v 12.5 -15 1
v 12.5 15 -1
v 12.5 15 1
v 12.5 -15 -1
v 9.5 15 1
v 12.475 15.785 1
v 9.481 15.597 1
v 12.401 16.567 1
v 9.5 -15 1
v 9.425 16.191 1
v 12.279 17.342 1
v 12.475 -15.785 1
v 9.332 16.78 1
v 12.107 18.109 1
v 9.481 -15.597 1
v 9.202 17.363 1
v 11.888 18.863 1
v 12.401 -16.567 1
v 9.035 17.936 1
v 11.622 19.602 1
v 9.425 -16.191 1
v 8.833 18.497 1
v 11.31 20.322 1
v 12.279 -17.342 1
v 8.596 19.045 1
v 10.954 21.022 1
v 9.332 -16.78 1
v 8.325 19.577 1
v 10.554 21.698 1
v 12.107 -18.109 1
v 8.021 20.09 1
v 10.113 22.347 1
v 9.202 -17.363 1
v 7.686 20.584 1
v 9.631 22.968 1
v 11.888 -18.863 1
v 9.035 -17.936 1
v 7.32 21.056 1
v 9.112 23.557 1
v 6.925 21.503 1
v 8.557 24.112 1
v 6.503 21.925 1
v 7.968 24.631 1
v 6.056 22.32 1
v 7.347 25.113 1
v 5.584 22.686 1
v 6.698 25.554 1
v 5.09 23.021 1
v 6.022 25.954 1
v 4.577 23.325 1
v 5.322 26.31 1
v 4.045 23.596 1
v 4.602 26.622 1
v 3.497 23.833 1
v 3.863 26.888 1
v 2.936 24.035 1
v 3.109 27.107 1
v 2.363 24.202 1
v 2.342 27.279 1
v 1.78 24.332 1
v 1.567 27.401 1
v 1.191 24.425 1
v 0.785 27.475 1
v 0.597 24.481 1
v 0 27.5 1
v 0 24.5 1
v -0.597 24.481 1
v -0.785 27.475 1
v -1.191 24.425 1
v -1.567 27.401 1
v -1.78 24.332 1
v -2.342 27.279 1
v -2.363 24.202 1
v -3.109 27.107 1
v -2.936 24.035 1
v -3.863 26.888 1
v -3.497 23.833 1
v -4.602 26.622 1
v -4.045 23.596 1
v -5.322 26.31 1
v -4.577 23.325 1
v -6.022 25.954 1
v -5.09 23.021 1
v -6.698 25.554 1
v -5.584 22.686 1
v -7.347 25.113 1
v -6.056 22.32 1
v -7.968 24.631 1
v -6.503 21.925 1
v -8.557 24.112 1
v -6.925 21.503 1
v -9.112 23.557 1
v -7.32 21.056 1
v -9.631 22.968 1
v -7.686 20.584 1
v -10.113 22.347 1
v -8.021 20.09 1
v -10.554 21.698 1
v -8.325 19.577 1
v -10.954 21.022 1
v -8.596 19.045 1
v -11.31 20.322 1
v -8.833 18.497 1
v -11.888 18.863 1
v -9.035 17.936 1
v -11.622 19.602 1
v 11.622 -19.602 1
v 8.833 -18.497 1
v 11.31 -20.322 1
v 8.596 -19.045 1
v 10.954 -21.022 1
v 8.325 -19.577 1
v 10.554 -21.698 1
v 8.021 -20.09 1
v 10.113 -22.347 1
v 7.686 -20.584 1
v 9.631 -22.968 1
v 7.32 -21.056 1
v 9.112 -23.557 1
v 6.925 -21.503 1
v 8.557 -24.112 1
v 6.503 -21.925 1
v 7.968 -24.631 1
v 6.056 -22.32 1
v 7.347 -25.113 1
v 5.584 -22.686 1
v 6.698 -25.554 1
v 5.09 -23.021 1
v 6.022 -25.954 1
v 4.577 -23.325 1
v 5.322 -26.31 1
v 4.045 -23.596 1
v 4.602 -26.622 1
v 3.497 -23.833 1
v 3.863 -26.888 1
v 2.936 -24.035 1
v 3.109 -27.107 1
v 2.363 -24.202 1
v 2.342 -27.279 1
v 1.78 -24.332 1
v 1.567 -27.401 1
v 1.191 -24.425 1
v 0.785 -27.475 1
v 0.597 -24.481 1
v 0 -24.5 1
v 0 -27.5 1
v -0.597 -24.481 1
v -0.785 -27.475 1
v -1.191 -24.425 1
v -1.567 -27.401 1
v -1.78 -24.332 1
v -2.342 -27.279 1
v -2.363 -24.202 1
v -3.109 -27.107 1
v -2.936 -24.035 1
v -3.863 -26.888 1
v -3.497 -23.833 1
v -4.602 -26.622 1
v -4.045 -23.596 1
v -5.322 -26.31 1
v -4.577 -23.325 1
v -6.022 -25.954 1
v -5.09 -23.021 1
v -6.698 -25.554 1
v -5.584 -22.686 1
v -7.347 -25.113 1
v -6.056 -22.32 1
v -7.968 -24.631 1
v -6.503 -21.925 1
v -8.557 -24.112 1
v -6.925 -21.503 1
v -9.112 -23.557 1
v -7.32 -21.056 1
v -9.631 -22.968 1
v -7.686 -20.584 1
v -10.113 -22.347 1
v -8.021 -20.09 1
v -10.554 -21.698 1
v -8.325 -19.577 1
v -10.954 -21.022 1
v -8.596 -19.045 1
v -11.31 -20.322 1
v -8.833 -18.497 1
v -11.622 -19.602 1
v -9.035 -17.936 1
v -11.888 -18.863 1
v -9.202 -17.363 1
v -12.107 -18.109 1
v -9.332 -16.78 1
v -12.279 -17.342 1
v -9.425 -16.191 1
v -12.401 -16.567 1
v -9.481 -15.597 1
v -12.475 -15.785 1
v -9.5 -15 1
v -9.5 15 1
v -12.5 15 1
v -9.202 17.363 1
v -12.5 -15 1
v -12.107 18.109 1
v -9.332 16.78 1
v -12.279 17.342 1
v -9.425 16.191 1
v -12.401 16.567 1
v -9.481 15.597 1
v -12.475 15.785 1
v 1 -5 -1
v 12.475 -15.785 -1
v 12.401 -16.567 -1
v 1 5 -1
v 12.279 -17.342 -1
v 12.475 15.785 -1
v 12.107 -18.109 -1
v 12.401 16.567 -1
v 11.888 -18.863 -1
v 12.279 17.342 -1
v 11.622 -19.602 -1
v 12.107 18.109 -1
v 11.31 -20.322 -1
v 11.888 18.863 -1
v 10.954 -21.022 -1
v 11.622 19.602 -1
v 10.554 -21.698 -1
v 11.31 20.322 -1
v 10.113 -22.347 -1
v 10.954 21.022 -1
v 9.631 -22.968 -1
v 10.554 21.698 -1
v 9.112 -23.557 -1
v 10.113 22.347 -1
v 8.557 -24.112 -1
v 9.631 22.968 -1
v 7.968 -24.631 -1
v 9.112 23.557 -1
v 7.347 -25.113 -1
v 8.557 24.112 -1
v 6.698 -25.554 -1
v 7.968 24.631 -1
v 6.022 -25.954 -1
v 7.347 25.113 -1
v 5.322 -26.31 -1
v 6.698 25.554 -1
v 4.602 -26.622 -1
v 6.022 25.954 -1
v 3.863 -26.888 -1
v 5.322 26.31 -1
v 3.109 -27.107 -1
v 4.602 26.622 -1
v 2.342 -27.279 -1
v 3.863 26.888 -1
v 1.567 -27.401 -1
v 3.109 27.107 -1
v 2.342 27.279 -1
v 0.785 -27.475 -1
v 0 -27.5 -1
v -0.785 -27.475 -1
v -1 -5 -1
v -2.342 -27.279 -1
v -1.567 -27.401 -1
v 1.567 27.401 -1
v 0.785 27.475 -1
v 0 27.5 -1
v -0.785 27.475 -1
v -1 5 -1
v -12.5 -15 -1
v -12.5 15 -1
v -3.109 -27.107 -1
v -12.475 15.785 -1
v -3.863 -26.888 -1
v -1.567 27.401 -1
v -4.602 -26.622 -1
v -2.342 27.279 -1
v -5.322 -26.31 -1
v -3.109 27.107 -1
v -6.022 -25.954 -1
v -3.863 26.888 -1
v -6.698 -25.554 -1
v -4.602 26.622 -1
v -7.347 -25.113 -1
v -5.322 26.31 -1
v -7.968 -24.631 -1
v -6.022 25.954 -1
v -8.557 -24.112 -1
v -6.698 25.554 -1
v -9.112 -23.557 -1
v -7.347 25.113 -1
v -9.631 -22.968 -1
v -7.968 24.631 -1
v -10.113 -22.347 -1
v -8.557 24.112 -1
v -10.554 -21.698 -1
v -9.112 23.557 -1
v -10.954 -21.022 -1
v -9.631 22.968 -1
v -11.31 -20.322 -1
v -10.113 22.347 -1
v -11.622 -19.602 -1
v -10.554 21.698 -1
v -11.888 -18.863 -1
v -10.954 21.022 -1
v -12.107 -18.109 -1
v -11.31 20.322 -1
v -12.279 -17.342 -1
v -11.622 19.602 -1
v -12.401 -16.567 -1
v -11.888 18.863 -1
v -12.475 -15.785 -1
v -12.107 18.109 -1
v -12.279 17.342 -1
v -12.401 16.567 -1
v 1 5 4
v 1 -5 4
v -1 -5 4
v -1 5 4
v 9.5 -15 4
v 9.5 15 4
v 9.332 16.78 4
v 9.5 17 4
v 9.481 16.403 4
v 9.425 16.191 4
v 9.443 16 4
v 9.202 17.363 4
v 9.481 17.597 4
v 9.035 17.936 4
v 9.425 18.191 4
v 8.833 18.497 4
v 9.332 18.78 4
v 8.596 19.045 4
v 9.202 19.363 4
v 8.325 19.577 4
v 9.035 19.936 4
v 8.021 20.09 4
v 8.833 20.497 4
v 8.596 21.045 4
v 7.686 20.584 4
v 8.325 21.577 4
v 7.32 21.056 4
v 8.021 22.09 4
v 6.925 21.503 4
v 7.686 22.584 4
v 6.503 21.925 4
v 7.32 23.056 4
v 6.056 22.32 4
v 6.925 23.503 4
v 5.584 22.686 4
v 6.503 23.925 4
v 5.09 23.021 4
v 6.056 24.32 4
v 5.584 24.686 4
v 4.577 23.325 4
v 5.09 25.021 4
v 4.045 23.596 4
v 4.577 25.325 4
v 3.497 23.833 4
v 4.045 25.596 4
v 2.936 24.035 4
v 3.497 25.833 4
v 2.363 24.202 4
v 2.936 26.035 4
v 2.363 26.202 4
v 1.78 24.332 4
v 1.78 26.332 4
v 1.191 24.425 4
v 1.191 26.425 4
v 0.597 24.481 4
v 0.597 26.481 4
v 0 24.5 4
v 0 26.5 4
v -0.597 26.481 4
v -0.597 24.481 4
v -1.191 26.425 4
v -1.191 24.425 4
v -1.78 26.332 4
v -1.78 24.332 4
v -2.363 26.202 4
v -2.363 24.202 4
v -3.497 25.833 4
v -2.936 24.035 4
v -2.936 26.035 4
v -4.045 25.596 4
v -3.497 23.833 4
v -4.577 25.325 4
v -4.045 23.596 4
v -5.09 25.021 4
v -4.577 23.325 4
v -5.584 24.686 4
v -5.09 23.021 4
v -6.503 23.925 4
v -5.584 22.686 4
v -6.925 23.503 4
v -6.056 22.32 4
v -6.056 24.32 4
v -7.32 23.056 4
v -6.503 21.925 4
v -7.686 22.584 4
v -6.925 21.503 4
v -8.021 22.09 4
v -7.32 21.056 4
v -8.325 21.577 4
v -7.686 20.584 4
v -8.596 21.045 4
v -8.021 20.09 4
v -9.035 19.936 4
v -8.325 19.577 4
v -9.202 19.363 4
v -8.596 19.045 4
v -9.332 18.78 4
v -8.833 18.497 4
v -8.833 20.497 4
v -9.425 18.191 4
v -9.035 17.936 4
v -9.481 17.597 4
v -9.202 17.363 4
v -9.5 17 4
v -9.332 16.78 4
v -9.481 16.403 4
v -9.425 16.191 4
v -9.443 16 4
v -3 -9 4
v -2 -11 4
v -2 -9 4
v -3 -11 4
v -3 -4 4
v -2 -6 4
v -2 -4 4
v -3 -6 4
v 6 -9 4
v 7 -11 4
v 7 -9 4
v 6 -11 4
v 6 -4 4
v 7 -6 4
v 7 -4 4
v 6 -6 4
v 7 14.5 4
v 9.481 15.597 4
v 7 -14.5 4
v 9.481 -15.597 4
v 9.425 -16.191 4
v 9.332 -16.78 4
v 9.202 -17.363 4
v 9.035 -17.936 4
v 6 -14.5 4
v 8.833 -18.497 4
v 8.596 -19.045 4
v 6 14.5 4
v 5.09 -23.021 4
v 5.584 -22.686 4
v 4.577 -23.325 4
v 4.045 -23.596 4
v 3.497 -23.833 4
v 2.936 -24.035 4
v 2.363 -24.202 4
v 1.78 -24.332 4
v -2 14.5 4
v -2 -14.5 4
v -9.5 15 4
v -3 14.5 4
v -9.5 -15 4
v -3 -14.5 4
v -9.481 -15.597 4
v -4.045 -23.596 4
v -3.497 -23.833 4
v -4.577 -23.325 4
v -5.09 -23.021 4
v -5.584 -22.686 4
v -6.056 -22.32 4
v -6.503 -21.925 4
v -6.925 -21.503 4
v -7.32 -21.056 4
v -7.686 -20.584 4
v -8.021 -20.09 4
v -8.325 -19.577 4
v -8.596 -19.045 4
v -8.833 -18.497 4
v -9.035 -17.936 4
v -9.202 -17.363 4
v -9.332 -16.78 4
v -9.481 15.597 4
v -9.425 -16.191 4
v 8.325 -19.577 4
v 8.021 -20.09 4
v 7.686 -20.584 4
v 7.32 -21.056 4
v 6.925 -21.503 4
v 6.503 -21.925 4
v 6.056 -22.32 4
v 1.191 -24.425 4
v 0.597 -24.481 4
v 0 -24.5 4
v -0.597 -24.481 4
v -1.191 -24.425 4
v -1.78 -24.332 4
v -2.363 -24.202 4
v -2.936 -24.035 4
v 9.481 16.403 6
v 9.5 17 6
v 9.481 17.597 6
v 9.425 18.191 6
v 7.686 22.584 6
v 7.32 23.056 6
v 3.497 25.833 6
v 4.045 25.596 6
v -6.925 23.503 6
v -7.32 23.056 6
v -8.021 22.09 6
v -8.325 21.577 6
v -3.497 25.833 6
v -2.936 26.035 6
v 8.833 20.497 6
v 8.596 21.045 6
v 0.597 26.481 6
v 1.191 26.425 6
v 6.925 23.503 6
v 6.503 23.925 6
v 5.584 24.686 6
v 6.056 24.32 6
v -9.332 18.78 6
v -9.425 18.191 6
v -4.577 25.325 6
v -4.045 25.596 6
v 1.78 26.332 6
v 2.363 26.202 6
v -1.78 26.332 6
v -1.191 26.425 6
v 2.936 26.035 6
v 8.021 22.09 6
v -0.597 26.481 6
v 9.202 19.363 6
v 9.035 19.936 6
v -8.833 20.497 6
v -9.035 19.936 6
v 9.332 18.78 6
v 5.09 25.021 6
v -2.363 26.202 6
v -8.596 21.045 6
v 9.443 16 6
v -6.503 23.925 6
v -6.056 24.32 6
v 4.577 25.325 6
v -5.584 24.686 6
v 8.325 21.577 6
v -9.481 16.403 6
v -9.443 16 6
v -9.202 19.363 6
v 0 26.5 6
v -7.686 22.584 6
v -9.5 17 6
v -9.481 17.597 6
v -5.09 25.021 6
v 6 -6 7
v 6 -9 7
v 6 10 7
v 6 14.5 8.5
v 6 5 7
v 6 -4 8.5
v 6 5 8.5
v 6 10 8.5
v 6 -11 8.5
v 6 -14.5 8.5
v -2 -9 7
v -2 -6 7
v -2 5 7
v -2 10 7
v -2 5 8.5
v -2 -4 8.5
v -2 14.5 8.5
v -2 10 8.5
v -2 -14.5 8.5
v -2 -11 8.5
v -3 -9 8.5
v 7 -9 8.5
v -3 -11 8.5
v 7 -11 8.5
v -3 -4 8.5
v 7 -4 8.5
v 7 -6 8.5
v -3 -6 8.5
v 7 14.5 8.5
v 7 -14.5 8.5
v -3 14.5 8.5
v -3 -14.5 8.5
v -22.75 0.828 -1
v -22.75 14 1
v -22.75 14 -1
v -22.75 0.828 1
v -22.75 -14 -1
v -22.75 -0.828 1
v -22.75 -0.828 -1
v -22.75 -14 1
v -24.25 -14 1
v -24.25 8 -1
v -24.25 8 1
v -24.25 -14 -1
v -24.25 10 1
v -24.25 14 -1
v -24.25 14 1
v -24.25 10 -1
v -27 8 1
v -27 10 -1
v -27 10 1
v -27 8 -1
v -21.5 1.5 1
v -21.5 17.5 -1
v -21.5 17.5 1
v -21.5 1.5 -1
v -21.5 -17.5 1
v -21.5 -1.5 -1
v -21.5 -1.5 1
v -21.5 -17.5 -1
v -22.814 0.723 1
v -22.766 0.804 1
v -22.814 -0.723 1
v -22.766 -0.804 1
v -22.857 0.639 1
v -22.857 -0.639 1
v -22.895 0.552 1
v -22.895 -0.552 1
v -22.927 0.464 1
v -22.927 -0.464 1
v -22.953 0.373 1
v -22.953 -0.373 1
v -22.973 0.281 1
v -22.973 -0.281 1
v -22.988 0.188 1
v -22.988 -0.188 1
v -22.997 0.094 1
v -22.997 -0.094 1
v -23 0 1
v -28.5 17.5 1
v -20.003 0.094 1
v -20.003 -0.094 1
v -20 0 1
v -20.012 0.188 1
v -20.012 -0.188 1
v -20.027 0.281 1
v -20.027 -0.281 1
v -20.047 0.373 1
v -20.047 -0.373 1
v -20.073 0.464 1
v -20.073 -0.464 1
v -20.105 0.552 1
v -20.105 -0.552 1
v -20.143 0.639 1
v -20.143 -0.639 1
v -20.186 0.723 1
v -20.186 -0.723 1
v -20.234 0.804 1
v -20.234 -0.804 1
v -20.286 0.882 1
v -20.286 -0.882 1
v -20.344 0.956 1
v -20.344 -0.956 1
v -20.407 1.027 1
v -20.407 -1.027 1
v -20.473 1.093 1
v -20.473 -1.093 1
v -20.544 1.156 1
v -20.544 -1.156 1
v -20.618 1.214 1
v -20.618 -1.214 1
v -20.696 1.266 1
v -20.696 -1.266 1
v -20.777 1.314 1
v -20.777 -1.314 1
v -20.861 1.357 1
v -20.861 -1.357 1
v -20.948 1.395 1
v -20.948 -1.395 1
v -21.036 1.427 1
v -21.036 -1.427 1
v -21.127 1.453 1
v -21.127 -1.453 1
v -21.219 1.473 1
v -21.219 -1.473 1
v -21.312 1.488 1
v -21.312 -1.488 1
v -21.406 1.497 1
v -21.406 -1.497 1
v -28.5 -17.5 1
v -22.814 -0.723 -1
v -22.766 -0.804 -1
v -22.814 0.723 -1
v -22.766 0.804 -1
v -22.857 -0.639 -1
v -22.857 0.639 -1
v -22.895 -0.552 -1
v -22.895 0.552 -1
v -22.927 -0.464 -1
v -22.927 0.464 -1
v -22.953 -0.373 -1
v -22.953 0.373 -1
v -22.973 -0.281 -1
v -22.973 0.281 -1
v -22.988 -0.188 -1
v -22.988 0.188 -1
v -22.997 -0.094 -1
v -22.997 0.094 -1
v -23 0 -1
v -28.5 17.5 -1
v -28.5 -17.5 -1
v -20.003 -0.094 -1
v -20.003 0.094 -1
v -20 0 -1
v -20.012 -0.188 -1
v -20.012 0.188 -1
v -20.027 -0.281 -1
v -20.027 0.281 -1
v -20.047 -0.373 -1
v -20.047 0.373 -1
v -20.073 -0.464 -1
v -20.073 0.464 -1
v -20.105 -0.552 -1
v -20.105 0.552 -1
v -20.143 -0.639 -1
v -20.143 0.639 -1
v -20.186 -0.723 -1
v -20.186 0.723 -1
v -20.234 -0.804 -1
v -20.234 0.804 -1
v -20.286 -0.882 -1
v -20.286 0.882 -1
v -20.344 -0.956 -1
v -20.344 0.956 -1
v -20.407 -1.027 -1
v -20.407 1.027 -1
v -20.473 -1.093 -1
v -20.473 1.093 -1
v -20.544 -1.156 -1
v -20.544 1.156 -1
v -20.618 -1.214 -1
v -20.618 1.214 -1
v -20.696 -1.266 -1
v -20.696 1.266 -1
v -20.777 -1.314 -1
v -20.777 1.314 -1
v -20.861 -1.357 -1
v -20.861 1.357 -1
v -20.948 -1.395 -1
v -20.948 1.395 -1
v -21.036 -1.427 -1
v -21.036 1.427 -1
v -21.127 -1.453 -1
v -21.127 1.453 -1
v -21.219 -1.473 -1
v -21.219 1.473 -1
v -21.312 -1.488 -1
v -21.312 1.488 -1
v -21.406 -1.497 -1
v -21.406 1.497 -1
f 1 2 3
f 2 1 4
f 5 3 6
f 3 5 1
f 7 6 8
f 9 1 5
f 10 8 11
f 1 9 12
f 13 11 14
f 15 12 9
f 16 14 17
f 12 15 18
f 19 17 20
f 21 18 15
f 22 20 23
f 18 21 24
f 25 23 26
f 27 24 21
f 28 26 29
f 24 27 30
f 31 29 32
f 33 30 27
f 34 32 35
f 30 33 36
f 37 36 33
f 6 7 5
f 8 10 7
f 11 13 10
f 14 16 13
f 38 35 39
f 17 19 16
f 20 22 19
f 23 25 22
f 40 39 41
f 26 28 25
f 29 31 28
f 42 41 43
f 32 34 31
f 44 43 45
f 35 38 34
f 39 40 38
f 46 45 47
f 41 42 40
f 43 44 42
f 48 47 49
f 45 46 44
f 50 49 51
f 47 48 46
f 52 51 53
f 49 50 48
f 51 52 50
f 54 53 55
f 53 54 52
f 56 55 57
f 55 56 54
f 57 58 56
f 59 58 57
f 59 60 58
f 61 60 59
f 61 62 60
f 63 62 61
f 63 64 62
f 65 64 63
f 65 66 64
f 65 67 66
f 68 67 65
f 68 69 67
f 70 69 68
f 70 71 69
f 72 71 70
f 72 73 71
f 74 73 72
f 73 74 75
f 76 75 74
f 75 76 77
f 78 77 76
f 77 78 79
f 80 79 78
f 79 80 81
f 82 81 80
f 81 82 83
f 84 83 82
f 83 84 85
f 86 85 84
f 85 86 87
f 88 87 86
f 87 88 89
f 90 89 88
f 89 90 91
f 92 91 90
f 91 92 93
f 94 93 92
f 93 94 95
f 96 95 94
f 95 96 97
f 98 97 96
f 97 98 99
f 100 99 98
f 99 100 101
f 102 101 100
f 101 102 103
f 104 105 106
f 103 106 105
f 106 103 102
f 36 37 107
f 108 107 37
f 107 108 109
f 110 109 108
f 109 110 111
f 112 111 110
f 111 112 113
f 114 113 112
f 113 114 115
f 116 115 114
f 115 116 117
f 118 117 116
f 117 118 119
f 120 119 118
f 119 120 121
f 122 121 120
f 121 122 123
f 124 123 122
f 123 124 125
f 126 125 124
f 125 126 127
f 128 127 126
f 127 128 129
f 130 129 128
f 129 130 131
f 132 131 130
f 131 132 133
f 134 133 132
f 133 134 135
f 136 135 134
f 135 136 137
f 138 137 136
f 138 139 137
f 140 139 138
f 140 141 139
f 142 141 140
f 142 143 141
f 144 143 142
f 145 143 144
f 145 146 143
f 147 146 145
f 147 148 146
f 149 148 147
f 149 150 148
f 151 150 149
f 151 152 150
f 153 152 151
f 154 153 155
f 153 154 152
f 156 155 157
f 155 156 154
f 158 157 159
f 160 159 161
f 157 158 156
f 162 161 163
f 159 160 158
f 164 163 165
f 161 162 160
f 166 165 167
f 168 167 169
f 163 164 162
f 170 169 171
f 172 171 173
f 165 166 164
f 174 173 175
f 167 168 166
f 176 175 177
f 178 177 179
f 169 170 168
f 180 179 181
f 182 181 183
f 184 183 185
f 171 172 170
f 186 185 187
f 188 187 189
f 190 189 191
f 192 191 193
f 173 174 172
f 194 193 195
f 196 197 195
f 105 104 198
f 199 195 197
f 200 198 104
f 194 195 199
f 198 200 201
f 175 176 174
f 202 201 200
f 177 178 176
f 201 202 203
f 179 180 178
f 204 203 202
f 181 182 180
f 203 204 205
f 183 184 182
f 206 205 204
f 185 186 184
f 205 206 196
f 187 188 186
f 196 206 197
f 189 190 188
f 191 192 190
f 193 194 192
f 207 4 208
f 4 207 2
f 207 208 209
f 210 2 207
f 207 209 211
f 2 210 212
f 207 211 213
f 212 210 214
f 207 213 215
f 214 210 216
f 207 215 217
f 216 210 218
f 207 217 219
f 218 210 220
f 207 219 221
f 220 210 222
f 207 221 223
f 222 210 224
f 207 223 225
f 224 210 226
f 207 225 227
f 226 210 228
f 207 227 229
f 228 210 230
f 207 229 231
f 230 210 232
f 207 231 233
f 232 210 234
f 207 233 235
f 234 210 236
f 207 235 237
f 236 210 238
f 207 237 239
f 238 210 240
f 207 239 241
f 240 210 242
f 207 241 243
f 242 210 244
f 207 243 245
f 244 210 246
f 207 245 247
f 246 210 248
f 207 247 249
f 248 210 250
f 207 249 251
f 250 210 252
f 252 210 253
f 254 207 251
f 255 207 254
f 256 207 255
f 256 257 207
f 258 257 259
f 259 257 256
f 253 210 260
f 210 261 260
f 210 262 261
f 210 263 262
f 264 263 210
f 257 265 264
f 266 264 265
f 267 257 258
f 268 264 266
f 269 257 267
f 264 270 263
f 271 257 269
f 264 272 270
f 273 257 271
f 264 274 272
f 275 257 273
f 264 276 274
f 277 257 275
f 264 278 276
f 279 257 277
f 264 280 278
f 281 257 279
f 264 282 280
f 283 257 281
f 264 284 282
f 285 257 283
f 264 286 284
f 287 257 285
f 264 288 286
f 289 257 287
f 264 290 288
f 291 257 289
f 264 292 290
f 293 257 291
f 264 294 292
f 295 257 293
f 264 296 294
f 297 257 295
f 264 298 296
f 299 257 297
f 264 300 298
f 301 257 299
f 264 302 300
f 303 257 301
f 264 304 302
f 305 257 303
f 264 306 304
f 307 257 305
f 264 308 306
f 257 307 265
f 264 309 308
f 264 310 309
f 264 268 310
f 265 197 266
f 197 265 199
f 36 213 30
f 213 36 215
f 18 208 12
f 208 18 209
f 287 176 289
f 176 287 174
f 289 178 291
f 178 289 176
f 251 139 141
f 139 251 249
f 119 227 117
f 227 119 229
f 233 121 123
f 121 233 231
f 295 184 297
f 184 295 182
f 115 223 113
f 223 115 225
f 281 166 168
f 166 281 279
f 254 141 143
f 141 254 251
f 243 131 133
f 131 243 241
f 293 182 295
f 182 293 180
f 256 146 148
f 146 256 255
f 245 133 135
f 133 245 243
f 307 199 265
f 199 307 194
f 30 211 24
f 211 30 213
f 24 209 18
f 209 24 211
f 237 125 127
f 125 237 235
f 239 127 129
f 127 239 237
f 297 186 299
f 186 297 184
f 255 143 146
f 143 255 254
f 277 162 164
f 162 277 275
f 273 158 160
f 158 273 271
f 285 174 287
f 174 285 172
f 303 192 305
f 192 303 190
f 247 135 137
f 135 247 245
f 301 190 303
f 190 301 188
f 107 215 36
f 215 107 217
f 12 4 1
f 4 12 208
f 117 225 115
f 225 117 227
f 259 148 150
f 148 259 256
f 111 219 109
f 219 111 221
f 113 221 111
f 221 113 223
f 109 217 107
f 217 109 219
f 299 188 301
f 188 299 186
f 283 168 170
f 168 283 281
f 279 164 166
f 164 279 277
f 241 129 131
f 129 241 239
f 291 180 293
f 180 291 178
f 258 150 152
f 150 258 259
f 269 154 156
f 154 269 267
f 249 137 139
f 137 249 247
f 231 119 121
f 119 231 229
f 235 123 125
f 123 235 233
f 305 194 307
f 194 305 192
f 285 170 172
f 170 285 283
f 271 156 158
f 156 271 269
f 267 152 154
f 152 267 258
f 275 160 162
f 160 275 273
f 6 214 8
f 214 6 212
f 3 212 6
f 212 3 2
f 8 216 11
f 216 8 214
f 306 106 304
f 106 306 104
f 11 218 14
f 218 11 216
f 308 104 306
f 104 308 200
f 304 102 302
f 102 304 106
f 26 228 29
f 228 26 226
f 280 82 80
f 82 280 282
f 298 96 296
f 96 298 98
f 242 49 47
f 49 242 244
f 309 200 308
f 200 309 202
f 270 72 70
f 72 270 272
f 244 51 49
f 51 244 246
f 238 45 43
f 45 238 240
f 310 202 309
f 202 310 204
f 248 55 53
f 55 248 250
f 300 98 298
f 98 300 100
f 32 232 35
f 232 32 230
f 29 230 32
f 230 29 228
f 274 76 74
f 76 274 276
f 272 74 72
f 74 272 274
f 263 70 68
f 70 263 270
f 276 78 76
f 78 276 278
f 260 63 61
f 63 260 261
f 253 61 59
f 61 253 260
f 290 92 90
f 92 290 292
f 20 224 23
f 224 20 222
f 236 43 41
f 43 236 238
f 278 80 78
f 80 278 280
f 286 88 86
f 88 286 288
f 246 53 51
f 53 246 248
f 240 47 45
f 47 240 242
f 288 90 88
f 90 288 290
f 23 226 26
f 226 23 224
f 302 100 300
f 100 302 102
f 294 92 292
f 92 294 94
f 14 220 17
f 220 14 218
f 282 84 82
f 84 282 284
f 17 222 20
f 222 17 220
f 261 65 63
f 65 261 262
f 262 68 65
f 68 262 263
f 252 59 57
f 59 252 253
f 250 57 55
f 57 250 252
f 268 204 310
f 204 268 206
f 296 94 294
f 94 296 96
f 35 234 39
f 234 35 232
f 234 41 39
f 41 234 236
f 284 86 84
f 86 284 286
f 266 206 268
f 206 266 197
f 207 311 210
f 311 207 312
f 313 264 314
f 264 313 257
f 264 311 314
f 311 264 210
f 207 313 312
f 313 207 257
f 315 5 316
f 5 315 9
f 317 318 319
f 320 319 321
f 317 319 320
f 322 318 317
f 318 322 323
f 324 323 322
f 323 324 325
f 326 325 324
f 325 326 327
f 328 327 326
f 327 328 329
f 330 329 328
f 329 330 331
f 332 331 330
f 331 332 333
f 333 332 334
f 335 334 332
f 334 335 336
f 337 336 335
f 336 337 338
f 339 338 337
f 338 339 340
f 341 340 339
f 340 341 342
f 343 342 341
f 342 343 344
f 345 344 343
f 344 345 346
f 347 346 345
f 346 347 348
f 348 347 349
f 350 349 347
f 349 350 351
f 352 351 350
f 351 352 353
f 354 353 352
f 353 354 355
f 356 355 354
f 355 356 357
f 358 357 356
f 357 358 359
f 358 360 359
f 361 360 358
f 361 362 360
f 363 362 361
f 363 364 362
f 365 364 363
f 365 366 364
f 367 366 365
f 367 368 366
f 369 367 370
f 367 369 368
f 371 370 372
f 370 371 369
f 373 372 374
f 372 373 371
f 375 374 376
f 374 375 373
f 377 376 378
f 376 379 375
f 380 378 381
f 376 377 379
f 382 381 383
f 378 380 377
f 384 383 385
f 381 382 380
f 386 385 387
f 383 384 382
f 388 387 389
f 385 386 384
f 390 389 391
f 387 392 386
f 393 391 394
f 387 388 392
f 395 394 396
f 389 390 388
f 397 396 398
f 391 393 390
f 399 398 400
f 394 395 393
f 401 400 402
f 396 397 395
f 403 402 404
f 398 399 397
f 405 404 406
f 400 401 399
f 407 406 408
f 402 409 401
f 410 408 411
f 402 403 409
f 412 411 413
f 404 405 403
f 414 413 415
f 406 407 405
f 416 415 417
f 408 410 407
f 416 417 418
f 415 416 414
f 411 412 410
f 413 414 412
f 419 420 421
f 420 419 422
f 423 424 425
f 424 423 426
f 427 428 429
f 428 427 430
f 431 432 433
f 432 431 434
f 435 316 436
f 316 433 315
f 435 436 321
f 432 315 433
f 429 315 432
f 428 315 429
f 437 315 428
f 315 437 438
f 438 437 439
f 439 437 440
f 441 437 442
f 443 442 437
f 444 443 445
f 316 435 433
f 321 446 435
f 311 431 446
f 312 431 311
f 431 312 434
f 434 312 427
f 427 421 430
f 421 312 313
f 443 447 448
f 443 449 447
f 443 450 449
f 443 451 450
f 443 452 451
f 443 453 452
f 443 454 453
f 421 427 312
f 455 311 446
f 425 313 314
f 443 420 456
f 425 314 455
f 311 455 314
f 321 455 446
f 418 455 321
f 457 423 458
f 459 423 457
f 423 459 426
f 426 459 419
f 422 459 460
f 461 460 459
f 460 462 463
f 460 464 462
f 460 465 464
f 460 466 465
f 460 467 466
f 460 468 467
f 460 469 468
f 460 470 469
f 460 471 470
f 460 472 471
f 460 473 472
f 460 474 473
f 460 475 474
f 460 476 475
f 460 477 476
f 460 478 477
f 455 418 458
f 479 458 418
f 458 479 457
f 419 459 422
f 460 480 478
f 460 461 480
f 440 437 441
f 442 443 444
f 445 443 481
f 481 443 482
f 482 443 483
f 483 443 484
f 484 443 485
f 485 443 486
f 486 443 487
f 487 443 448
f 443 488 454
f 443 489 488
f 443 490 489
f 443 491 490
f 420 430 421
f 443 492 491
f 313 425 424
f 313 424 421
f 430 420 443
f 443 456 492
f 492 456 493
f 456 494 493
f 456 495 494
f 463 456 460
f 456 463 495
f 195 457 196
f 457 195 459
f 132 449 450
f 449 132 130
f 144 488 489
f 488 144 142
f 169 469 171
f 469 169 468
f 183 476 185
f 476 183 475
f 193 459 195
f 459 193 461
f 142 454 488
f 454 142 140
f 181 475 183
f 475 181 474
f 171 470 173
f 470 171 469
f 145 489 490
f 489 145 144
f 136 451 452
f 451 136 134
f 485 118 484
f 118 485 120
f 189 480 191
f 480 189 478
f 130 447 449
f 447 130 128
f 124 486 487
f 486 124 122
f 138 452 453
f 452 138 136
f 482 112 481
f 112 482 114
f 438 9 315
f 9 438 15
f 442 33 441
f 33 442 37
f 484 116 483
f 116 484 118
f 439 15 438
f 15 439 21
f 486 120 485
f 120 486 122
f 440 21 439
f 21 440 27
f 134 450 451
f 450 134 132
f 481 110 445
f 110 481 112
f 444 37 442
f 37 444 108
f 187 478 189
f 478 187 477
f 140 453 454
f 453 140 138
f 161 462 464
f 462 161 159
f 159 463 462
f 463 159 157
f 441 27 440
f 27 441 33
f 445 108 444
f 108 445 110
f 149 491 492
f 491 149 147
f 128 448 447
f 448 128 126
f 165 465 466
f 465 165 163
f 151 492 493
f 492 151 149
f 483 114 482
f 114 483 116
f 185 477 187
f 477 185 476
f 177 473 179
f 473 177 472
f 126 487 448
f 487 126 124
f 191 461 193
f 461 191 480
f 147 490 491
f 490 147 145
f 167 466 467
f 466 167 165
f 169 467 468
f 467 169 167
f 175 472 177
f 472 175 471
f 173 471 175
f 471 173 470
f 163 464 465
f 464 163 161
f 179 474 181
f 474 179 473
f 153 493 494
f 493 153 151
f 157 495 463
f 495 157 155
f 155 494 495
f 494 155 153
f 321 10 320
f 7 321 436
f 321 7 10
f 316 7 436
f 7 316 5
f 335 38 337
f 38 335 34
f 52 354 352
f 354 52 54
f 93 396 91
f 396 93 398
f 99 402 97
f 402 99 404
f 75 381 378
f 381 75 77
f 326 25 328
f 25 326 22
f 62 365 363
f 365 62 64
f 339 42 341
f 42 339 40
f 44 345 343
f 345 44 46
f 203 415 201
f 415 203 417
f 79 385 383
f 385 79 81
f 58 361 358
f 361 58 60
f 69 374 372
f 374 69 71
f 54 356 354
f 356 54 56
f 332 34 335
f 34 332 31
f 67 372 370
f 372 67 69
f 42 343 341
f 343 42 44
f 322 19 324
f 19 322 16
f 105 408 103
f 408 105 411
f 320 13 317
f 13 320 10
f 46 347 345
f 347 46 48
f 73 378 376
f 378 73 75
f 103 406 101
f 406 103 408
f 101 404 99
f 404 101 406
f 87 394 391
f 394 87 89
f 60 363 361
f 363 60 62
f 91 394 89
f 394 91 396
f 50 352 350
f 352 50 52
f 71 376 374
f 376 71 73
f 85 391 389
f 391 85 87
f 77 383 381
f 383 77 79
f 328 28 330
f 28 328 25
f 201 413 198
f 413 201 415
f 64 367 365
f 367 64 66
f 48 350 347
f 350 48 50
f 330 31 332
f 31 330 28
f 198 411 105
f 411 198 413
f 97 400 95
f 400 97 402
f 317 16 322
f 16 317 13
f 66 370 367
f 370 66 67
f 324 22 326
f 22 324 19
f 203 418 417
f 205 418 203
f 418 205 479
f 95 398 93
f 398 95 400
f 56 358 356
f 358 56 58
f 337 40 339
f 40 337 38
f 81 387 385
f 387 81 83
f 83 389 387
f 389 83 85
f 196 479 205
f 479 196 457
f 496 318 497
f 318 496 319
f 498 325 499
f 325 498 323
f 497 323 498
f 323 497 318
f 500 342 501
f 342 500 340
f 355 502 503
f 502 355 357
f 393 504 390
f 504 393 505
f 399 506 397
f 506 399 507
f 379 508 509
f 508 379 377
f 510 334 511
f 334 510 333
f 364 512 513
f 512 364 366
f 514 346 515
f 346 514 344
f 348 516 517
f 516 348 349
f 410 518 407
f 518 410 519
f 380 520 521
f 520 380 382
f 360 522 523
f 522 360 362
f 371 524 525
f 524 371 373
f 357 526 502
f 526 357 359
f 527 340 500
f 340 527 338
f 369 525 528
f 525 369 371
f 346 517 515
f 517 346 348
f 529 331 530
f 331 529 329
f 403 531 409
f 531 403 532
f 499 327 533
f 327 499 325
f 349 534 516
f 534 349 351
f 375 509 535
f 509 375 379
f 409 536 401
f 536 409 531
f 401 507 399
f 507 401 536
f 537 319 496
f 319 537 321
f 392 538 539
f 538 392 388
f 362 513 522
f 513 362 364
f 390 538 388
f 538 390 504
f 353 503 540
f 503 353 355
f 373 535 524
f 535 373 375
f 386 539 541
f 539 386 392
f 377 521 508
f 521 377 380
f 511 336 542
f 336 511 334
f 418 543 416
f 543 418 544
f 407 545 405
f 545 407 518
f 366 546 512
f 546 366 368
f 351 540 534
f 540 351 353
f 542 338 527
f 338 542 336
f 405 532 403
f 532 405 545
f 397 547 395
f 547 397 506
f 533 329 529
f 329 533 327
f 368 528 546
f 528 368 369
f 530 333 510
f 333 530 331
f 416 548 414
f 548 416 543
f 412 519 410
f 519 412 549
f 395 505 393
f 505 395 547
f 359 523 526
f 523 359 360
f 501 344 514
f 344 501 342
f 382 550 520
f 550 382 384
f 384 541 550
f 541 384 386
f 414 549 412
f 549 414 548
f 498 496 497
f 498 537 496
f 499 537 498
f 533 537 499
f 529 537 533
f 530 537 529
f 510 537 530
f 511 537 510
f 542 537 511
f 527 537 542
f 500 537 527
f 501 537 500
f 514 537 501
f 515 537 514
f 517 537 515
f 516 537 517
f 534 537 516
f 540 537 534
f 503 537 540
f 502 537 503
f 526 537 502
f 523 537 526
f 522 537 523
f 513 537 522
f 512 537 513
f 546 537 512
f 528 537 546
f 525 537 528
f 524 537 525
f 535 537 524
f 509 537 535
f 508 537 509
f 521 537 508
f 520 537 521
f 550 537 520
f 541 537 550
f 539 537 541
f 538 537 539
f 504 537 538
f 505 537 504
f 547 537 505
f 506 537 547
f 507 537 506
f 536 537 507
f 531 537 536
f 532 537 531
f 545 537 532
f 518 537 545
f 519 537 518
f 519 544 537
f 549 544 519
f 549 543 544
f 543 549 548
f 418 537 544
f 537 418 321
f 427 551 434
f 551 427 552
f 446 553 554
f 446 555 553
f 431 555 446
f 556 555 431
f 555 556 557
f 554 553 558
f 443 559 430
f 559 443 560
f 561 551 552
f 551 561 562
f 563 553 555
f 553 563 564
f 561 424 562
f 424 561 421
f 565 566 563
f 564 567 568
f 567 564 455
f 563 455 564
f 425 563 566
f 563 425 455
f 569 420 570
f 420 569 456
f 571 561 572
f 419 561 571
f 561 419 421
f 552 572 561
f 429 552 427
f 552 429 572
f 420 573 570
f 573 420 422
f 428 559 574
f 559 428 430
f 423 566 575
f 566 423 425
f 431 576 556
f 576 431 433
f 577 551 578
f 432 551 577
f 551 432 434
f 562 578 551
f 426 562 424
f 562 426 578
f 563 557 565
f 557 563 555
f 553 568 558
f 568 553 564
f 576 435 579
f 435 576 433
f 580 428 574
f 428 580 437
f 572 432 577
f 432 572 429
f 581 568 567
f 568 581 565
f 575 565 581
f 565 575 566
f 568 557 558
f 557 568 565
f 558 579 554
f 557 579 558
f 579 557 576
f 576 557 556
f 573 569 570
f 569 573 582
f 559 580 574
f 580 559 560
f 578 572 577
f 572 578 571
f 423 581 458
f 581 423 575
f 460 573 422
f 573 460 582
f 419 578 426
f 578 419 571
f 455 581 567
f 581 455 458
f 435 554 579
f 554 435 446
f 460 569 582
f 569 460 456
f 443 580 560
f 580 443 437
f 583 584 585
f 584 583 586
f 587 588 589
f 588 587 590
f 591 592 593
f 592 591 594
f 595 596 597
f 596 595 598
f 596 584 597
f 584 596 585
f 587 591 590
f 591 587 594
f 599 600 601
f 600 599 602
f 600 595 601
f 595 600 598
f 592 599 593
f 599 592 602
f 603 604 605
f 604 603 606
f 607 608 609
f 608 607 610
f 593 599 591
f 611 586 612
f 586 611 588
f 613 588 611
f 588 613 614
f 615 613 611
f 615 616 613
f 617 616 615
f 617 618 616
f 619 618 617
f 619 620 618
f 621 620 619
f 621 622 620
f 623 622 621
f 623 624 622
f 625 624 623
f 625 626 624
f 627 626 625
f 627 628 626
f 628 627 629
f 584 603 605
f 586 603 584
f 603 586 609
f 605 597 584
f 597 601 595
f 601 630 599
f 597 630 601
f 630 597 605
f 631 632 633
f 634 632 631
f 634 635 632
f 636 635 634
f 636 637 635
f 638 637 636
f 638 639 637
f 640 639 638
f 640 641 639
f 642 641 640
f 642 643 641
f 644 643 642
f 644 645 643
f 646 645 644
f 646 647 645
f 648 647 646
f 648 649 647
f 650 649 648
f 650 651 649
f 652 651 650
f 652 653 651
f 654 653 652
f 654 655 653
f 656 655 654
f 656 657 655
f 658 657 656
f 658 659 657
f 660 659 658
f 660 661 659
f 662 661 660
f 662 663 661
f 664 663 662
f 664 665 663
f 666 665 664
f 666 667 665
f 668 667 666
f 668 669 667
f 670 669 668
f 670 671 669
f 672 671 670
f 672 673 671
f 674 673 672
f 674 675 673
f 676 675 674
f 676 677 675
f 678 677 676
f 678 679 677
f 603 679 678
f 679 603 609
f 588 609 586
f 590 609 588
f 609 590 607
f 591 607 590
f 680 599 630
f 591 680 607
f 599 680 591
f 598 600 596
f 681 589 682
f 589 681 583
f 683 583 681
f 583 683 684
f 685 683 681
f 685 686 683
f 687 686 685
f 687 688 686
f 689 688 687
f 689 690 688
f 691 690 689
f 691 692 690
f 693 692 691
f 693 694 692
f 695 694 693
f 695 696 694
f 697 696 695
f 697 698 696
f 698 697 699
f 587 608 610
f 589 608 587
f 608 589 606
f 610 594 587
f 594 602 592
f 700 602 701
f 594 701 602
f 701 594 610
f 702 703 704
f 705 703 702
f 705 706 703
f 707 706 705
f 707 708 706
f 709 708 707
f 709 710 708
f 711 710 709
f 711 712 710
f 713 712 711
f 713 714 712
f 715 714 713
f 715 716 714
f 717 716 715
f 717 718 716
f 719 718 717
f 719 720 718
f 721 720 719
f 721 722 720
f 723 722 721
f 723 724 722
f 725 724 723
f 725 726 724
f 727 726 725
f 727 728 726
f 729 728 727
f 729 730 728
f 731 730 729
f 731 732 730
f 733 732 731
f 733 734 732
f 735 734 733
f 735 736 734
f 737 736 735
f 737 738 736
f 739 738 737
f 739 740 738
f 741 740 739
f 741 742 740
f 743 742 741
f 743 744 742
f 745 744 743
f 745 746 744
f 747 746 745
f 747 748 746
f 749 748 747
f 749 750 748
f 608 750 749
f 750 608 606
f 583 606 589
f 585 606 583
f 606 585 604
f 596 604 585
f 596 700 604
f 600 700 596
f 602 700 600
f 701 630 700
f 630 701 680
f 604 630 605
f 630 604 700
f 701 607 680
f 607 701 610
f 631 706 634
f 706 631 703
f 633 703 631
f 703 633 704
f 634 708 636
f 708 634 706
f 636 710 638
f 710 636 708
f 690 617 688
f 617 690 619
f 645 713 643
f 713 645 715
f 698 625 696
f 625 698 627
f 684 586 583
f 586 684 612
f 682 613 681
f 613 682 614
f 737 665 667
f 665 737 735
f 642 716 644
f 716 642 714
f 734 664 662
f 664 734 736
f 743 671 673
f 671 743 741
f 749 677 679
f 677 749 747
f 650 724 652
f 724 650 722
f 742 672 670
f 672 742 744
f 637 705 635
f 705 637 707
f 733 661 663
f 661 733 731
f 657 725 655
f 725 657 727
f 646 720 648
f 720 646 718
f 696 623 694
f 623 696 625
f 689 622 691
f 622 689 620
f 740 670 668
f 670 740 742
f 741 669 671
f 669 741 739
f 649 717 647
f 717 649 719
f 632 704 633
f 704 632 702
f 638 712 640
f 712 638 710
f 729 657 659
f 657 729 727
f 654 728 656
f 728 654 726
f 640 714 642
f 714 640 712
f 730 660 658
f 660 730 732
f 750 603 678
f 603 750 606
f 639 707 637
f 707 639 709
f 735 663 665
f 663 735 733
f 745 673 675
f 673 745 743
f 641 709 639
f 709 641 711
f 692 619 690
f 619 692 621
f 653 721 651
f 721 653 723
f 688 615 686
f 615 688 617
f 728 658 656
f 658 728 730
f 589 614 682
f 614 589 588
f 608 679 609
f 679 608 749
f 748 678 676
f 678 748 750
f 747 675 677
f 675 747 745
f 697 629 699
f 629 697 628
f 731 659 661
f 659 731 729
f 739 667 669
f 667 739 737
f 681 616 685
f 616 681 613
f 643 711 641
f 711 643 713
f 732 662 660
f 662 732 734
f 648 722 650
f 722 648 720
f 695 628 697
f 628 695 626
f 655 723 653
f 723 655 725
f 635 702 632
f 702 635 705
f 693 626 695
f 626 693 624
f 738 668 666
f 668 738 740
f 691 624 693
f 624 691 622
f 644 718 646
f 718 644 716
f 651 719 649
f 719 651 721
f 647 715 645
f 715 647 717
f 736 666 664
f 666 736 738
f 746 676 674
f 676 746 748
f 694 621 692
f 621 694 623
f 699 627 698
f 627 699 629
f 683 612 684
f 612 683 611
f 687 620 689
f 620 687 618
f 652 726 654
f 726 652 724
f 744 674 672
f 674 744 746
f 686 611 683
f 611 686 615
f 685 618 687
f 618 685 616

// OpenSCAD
draw_main_face = 1;
// Main face sizes
face_plate_length = 55;
face_plate_width = 25;
face_plate_height = 2;
face_slot_length = 10;
face_slot_width =2;
// Recess plate sizes
recess_plate_inset =3;
recess_plate_length = face_plate_length-recess_plate_inset*2;
recess_plate_width = face_plate_width-recess_plate_inset*2;
recess_plate_height = 3;
// flange to secure bottom of trim clip
flange_height = 2;
flange_overhang = 2;
//bolt
bolt_length = 35;
bolt_width = 7;
bolt_height = 2;
bolt_spring_gap = 1.5;

// bolt_slot
bolt_slot_inner_width = bolt_width +1;
bolt_slot_outer_width = bolt_slot_inner_width+3;
module draw_plate_with_slot(l, w, h, slot_length, slot_width)
{
    difference()
    {           
        union()
        {
            cube([w, l-w, h], center=true);
            translate([0, -(l-w)/2, 0])       
                cylinder(h=h, r=w/2, center=true);       
            translate([0,(l-w)/2 , 0])       
                cylinder(h=h, r=w/2, center=true);       
        }
        cube([slot_width, slot_length, h+1], center=true);
    }     
}
module visible_part()
{
    if (draw_main_face  == 1)
        draw_plate_with_slot(face_plate_length, face_plate_width, face_plate_height, 
            face_slot_length, face_slot_width);
}
module recess_plate()
{
    translate([0,0,(face_plate_height+recess_plate_height)/2])
    {
        draw_plate_with_slot(recess_plate_length, recess_plate_width, recess_plate_height,
                            face_slot_length, face_slot_width);
    }
}
module flange()
{
    difference()
    {
        translate([0, (recess_plate_length-recess_plate_width)/2 + flange_overhang,face_plate_height + recess_plate_height])
            cylinder(h=flange_height, r=recess_plate_width/2, center=true);
        translate([0, 0, face_plate_height + recess_plate_height])
            cube([recess_plate_width, recess_plate_length-recess_plate_width +flange_overhang , flange_height+0.1], center=true);
    }
}
module slot_for_bolt()
{
    translate([2, 0, 6])
    {
        difference()
        {
            cube([10, 29, 5], center=true);
            union()
            {
                // main slot
                translate([0,0,-1])
                    cube([8, 30, 4], center=true);
                // engagement notch part way down
                translate([0, -10, 0])
                    cube([11,2,6], center=true);
                translate([0, -5, 0])
                    cube([11,2,6], center=true);
                // cut part of roof off
                translate([0, 0, 0])
                    cube([8,10,6], center =true);
                // cut part of roof off
                translate([0, -12.5, 0])
                    cube([8,5,6], center =true);
                translate([0, 12.5, 0])
                    cube([8,5,6], center =true);
            }
        }
    }
}
module sprung_bolt()
{
    // Move bolt out of the way of the trim piece
    translate([-face_plate_width, 0, 0])
    {
        difference()
        {
            cube([bolt_width,bolt_length,bolt_height], center=true);
            union()
            {
                // add the slot to make it springy
                translate([bolt_width/2-2, 0, 0])
                    cube([bolt_spring_gap, bolt_length - 7, bolt_height+1], center=true);
                //add the hole to move it
                translate([-.5,9, 0])
                    cube([3,2,3], center=true);
            }
                
        }
        // add the little blob to click in the slots
        translate([3.5, 0, -1])
            cylinder(h=2, r=1.5);
    }
}
$fn=100;
visible_part();
recess_plate();
flange();
slot_for_bolt();
sprung_bolt();
